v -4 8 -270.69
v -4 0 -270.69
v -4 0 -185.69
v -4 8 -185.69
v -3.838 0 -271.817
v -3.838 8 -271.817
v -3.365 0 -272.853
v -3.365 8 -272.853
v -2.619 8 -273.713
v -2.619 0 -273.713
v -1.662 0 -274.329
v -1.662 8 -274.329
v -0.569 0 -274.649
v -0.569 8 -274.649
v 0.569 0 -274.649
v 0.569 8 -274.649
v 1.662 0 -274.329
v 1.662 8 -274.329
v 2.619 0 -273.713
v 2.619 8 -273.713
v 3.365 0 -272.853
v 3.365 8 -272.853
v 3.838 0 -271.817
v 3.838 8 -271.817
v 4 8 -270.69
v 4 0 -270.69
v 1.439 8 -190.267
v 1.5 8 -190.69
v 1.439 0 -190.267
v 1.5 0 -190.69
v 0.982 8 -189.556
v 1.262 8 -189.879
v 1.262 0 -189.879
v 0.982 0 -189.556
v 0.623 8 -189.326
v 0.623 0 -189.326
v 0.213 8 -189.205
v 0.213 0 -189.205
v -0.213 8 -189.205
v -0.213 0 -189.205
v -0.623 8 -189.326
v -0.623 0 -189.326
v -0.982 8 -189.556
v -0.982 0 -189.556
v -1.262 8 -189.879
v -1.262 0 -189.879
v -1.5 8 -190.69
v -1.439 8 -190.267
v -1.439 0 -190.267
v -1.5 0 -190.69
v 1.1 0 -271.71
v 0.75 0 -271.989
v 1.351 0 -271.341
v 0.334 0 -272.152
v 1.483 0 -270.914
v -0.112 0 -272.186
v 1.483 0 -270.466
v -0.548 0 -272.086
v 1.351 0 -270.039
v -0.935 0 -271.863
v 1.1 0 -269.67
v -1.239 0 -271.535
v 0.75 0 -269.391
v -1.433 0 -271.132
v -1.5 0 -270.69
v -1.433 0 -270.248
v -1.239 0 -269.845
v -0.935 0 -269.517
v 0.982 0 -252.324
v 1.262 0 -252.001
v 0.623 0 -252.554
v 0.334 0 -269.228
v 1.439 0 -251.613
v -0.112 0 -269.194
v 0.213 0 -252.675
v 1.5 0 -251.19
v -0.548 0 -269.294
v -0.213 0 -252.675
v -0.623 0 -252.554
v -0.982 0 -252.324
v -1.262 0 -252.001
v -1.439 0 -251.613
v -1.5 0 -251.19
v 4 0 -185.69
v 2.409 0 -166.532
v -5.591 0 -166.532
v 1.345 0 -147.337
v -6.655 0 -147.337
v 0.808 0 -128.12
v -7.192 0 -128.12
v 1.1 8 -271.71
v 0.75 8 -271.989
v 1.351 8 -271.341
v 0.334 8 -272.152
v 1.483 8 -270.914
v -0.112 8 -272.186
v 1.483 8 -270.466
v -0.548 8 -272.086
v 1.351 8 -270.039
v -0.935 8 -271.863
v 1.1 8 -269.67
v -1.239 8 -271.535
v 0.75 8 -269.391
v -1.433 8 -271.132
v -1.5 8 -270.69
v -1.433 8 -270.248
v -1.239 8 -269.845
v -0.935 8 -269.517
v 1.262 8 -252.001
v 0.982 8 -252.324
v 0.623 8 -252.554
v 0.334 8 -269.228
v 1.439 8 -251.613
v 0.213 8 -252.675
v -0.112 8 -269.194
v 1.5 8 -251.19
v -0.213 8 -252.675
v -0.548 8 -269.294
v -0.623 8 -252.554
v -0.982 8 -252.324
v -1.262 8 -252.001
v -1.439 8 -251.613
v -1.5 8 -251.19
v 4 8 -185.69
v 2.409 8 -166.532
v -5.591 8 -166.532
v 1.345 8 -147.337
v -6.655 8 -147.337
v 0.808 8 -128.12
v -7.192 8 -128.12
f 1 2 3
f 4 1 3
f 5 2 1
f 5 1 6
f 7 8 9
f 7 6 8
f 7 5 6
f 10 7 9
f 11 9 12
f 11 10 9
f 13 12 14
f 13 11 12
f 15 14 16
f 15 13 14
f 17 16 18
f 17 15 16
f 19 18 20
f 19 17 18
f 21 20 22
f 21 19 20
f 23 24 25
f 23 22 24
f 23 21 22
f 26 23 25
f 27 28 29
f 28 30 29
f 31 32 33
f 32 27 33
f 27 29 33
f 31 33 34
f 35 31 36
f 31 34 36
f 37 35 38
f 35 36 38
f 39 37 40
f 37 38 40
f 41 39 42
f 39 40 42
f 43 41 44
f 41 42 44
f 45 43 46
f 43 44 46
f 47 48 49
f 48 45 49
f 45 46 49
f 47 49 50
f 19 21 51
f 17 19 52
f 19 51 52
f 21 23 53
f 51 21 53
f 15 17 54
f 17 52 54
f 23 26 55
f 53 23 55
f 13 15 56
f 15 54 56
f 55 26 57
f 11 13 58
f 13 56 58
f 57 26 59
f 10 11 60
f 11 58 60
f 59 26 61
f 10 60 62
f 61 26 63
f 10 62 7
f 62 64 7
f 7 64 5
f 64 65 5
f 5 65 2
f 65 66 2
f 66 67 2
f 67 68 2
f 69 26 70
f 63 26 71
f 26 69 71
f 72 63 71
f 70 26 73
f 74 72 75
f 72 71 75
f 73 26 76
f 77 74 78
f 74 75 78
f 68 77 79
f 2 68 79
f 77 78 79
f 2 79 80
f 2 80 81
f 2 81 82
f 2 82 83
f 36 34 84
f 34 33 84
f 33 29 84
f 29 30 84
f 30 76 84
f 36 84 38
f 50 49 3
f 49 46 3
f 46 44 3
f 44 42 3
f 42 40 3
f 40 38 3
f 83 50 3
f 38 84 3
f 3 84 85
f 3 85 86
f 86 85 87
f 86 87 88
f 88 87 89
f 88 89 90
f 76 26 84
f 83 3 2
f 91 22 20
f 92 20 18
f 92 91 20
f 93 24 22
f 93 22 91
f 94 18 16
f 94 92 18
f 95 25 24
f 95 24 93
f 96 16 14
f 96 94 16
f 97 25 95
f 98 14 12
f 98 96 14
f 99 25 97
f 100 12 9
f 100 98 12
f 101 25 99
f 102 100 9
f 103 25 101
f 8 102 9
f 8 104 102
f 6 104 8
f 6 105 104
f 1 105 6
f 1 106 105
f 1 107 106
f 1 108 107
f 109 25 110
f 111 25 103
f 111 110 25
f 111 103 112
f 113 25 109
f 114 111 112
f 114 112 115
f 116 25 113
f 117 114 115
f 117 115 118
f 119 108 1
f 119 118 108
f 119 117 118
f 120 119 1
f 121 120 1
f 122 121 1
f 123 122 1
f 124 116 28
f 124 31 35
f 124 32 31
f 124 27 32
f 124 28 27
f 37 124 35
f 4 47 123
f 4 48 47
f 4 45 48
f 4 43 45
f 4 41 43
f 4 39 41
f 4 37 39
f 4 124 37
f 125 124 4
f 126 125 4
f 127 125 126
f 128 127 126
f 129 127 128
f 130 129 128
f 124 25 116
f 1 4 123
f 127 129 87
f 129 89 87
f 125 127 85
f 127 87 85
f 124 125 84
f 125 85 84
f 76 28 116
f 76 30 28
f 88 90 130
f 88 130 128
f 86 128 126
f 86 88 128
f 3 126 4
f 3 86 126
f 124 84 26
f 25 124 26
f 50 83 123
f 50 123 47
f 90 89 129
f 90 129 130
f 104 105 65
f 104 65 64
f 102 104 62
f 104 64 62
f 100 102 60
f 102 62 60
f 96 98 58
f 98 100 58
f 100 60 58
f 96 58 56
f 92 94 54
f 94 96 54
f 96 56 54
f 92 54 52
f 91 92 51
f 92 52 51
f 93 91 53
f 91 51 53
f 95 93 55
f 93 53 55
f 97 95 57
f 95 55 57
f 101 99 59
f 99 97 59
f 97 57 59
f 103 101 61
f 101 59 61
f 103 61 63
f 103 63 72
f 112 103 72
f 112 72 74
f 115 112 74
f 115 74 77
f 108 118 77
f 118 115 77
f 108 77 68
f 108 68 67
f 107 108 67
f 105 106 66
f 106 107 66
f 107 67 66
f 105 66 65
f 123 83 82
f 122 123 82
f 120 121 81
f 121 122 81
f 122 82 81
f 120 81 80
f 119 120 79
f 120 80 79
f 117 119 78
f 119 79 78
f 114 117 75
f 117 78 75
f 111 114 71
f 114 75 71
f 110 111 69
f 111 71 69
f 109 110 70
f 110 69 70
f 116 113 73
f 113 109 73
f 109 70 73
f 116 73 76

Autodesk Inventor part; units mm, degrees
ref_plane "XZ Plane" through (0, 0, 0) normal (0, 1, 0) x (-1, 0, 0)
ref_plane "XY Plane" through (0, 0, 0) normal (0, 0, 1) x (1, 0, 0)
sketch "Sketch1" plane through (0, 0, 0) normal (0, 1, 0) x (-1, 0, 0)
  line L0 (0, 0) -> (0, -270.69) construction
  line L1 (-4, 0) -> (-4, -270.69)
  line L2 (4, -270.69) -> (4, 0)
  arc A0 (4, 0) -> (-4, 0) centre (0, 0) ccw
  arc A1 (-4, -270.69) -> (4, -270.69) centre (0, -270.69) ccw
  circle A2 centre (0, 0) radius 1.5
  circle A3 centre (0, -270.69) radius 1.5
  line L3 (0, -251.19) -> (0, -190.69) construction
  line L4 (1.5, -251.19) -> (1.5, -190.69)
  line L5 (-1.5, -190.69) -> (-1.5, -251.19)
  arc A4 (-1.5, -251.19) -> (1.5, -251.19) centre (0, -251.19) ccw
  arc A5 (1.5, -190.69) -> (-1.5, -190.69) centre (0, -190.69) ccw
  arc A6 (-4, -185.69) -> (-4, -50.69) centre (-700.7379, -118.19) ccw
  arc A7 (4, -185.69) -> (4, -50.69) centre (-692.7379, -118.19) ccw
  point P0 (0, -135.345)
  point P1 (0, -220.94)
  dimension "d0" = 270.69
  dimension "d1" = 8
  dimension "d2" = 3
  dimension "d3" = 3
  dimension "d10" = 3
  dimension "d11" = 19.5
  dimension "d12" = 80
  dimension "d13" = 85
  dimension "d14" = 220
  dimension "d15" = 700
  dimension "d16" = 700
extrude "Extrusion1" add sketch "Sketch1" along normal blind 8 contours A0 L2 A1 L1 A6 | A7 L2
sketch "Sketch2" plane through (0, 0, 0) normal (0, -1, 0) x (1, 0, 0)
  line L0 (4, 0) -> (4, -50.69) projected
  arc A0 (4, 0) -> (-4, 0) centre (0, 0) ccw projected
  line L1 (-4, -50.69) -> (-4, 0) projected
  arc A1 (-4, -50.69) -> (-4, -185.69) centre (692.7379, -118.19) ccw projected
  line L2 (-4, -270.69) -> (-4, -185.69) projected
  arc A2 (-4, -270.69) -> (4, -270.69) centre (0, -270.69) ccw projected
  line L3 (4, -185.69) -> (4, -270.69) projected
  arc A3 (4, -50.69) -> (4, -185.69) centre (700.7379, -118.19) ccw projected
  circle A4 centre (0, 0) radius 1.5 projected
  circle A5 centre (0, -270.69) radius 1.5 projected
  arc A6 (-1.5, -251.19) -> (1.5, -251.19) centre (0, -251.19) ccw projected
  line L4 (-1.5, -190.69) -> (-1.5, -251.19) projected
  arc A7 (1.5, -190.69) -> (-1.5, -190.69) centre (0, -190.69) ccw projected
  line L5 (1.5, -251.19) -> (1.5, -190.69) projected
sketch "Sketch3" plane through (0, 8, 0) normal (0, 1, 0) x (1, 0, 0)
  line L0 (-41.336, 299.9474) -> (32.3712, 299.9474)
  line L1 (32.3712, 299.9474) -> (32.3712, 128.1205)
  line L2 (32.3712, 128.1205) -> (-41.336, 128.1205)
  line L3 (-41.336, 128.1205) -> (-41.336, 299.9474)
  line L4 (-75.6075, 328.1158) -> (61.009, 328.1158)
  line L5 (61.009, 328.1158) -> (61.009, -56.3822)
  line L6 (61.009, -56.3822) -> (-75.6075, -56.3822)
  line L7 (-75.6075, -56.3822) -> (-75.6075, 328.1158)
  point P0 (0, 0)
extrude "Extrusion2" cut sketch "Sketch3" along normal mid plane 20
properties part number "Part_11_p1"
